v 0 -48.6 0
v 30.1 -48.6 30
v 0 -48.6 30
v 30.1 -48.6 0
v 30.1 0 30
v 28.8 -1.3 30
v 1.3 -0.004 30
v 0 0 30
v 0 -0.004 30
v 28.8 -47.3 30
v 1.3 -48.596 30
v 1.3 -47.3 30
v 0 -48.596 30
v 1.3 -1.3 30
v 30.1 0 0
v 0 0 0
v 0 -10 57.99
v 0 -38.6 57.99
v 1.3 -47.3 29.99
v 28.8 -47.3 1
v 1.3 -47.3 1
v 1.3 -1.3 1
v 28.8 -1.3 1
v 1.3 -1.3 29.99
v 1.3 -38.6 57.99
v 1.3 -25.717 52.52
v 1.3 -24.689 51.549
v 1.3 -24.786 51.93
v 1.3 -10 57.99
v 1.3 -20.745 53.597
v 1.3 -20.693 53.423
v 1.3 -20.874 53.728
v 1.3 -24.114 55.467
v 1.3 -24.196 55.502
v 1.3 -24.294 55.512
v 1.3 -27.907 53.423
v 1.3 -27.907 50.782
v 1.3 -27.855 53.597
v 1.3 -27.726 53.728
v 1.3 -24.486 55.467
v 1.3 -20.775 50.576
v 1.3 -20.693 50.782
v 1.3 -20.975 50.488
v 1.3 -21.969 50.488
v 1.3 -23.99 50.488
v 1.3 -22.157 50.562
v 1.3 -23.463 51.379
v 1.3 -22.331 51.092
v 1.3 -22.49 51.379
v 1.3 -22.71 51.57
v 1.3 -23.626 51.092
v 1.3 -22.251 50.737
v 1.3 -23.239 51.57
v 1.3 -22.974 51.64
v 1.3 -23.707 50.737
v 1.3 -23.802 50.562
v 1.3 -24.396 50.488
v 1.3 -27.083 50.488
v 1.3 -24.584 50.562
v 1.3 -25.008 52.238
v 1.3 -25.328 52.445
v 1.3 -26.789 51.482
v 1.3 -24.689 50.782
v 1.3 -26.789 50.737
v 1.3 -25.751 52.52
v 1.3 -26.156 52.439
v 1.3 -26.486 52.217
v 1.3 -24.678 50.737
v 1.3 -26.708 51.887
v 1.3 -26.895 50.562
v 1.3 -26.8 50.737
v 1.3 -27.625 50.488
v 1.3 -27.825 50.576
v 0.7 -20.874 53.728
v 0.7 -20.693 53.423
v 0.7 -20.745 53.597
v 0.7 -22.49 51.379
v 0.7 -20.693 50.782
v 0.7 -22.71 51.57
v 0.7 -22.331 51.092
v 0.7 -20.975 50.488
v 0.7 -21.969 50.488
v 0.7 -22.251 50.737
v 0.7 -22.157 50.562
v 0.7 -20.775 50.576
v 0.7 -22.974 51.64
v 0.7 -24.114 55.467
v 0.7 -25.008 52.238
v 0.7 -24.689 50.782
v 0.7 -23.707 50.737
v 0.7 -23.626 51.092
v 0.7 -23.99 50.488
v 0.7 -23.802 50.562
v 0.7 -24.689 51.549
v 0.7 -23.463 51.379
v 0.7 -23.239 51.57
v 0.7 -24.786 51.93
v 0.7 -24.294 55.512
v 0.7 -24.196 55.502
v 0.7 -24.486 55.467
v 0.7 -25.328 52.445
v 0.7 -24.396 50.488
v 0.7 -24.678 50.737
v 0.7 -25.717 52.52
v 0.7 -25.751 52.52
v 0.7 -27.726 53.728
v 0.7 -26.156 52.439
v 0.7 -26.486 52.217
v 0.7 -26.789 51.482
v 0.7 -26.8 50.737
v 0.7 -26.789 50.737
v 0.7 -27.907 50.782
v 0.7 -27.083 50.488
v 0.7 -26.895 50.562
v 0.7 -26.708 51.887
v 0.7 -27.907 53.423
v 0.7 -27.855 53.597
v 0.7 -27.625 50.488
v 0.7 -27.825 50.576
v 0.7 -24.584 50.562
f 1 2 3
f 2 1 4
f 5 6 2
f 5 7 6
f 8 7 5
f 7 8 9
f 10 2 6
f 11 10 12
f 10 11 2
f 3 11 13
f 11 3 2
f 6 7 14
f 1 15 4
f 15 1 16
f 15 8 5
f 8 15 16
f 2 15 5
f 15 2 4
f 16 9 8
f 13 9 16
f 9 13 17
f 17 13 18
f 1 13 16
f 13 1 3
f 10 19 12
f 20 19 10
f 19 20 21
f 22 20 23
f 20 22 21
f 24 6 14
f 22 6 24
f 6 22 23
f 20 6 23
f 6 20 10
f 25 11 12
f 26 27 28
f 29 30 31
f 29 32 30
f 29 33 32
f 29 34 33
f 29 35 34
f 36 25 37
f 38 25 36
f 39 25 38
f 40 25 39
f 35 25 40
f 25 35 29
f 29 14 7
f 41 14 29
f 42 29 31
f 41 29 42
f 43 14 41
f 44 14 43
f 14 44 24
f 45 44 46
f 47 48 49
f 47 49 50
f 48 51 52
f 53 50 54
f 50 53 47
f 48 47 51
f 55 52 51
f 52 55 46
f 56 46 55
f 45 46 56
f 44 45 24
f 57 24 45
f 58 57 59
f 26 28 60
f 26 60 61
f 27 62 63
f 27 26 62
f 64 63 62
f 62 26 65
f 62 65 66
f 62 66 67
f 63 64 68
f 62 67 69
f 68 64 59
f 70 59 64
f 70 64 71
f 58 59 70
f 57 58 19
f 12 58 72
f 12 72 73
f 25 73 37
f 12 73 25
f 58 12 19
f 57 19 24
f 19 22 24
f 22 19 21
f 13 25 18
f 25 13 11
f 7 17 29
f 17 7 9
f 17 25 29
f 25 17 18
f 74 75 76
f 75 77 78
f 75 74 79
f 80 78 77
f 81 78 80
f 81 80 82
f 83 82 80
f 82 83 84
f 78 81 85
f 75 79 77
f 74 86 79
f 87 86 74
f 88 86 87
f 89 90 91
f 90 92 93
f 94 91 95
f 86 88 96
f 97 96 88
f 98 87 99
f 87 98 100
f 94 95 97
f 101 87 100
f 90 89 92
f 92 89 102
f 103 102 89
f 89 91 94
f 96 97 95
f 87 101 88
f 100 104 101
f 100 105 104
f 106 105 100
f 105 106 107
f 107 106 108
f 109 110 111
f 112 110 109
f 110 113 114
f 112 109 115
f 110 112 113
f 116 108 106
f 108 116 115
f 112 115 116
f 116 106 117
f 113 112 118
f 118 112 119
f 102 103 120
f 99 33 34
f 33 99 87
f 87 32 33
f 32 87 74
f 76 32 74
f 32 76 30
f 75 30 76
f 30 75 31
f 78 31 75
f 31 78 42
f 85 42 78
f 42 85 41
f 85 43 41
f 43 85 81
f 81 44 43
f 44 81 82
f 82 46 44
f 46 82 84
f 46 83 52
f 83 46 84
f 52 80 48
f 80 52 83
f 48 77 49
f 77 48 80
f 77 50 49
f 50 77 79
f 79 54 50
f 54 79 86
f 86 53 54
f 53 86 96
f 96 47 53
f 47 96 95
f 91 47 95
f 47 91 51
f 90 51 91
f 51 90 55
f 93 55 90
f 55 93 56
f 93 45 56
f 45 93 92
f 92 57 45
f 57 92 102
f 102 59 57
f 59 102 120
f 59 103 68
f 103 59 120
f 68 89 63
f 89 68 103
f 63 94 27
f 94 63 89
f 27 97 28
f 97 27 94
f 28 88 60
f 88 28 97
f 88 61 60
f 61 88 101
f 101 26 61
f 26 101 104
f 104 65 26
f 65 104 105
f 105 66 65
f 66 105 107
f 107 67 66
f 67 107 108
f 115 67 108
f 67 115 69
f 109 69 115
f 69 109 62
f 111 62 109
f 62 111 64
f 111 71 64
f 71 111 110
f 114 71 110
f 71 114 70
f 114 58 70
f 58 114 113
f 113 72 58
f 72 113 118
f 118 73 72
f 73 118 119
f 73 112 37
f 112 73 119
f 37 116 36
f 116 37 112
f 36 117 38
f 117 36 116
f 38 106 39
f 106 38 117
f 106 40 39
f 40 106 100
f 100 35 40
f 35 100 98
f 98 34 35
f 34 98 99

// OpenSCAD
floor_thickness = 1;
wall_thickness = 1.3;
wall_height = 30; // [25:40]
tab_height = 28;
icon = "abbey"; // [none:None,abbey:Abbey and Mayor,bridges:Bridges Castles and Bazaar,catapult:Catapult,count:Count,crop:Crop Circles,ferry:Ferries,flyer:Flyers,gold:Gold Mines,inns:Inns and Cathedrals,king:King,mage:Mage and Witch,messages:Messages,plague:Plague,princess:Princess and Dragon,robbers:Robbers,spielbox:Spielbox,tower:Tower,traders:Traders and Builders,wheel:Wheel of Fortune]

inset = 0.9;

inside_length = 27.5;

/* [Hidden] */
length = inside_length + wall_thickness * 2;
width = 46 + wall_thickness * 2;
fudge = 0.1;

rotate(a=[0,0,-90]) {
difference () {
union () {
difference () {
	cube([width,length,wall_height]);
	translate ([wall_thickness,wall_thickness,floor_thickness]) {
		cube([46,inside_length,wall_height]);
	}
};
translate([0,wall_thickness,wall_height-.01])
rotate(a=[90,0,0])
linear_extrude(height = wall_thickness)
	polygon(points=[[0,0],[10,tab_height],[width - 10,tab_height],[width,0]]);
};

translate([width/2,1.5 - inset + fudge,wall_height + tab_height - 5])
rotate(a=[90,0,180])
	if (icon == "abbey")
		abbey(inset + fudge);
	else if (icon == "bridges")
		bridges(inset + fudge);
	else if (icon == "catapult")
		catapult(inset + fudge);
	else if (icon == "count")
		count(inset + fudge);
	else if (icon == "crop")
		crop(inset + fudge);
	else if (icon == "ferry")
		ferry(inset + fudge);
	else if (icon == "flyer")
		flyer(inset + fudge);
	else if (icon == "gold")
		gold(inset + fudge);
	else if (icon == "inns")
		inns(inset + fudge);
	else if (icon == "king")
		king(inset + fudge);
	else if (icon == "mage")
		mage(inset + fudge);
	else if (icon == "messages")
		messages(inset + fudge);
	else if (icon == "plague")
		plague(inset + fudge);
	else if (icon == "princess")
		princess(inset + fudge);
	else if (icon == "robbers")
		robbers(inset + fudge);
	else if (icon == "spielbox")
		spielbox(inset + fudge);
	else if (icon == "tower")
		tower(inset + fudge);
	else if (icon == "traders")
		traders(inset + fudge);
	else if (icon == "wheel")
		wheel(inset + fudge);
	else if (icon == "m")
		m(inset + fudge);
};
};

module abbey(h) {
  scale([25.4/90, -25.4/90, 1])
  {
    linear_extrude(height=h)
      polygon([[4.699935,4.819935],[5.634285,5.066798],[6.414915,5.744925],[6.978016,6.760539],[7.259905,8.019895],[7.594905,8.639885],[8.259895,8.899885],[11.779845,8.899885],[12.489835,8.589885],[12.779835,7.859895],[12.779835,-1.499985],[12.594835,-2.114975],[12.139845,-2.579965],[0.659995,-8.739885],[0.369995,-8.864885],[0.019995,-8.899885],[-0.659995,-8.739885],[-12.139845,-2.579965],[-12.594835,-2.114975],[-12.779835,-1.499985],[-12.779835,7.859895],[-12.489845,8.589885],[-11.779845,8.899885],[-9.859875,8.899885],[-9.194885,8.639885],[-8.859885,8.019895],[-8.819885,8.019895],[-8.819885,5.379925],[-8.531781,3.944327],[-7.744905,2.774965],[-6.575549,1.988103],[-5.139935,1.699975],[-5.019935,1.699975],[-3.641211,1.967463],[-2.509965,2.699965],[-1.723740,3.792454],[-1.379985,5.139935],[-1.379985,7.859895],[-1.359985,7.939895],[-1.339985,8.019895],[-1.004985,8.639885],[-0.339995,8.899885],[1.099985,8.899885],[1.764975,8.639885],[2.099975,8.019895],[2.388076,6.760539],[2.964965,5.744925],[3.759314,5.066813],[4.699935,4.819935]]);
};
};
module bridges(h) {
  scale([25.4/90, -25.4/90, 1])
  {
    linear_extrude(height=h)
      polygon([[-13.159830,7.079910],[-9.959870,7.079910],[-9.959870,5.199930],[-9.738297,3.193399],[-9.181121,1.361236],[-8.288330,-0.296557],[-7.059910,-1.779980],[-5.576498,-3.008394],[-3.918709,-3.901191],[-2.086542,-4.458373],[-0.080000,-4.679940],[0.120000,-4.679940],[2.128714,-4.458365],[3.964936,-3.901184],[5.628668,-3.008391],[7.119910,-1.779980],[8.356128,-0.296557],[9.254860,1.361236],[9.816107,3.193399],[10.039870,5.199930],[10.039870,7.079910],[13.159830,7.079910],[13.159830,-7.079910],[-13.159830,-7.079910]]);
};
};
module catapult(h) {
difference()
{
  scale([25.4/90, -25.4/90, 1])
  {
    linear_extrude(height=h)
         polygon([[-9.779880,8.079900],[-8.689890,9.349880],[-7.059910,9.839870],[-5.429930,9.349880],[-4.339950,8.079900],[4.699940,8.079900],[5.789920,9.349880],[7.419900,9.839870],[9.049880,9.349880],[10.139870,8.079900],[10.939860,8.079900],[10.939860,5.399930],[10.059870,5.399930],[9.289880,4.484940],[8.219890,3.959950],[2.059970,-5.119930],[1.939970,-5.119930],[1.939970,-5.159930],[0.060000,-5.159930],[0.060000,-9.799870],[-0.020000,-9.819870],[-0.100000,-9.839870],[-1.266868,-9.595477],[-2.234970,-8.934880],[-2.895598,-7.966755],[-3.139960,-6.799910],[-2.956215,-5.775535],[-2.449970,-4.904940],[-1.688738,-4.251809],[-0.739990,-3.879950],[-0.739990,5.399930],[-4.419950,5.399930],[-5.514930,4.274940],[-7.059910,3.839950],[-8.604890,4.274950],[-9.699880,5.399930],[-10.939860,5.399930],[-10.939860,8.079900]]);
	};
  scale([25.4/90, -25.4/90, 1])
  {
    linear_extrude(height=h)
           polygon([[5.419930,4.639940],[5.069930,5.004940],[4.779940,5.399930],[1.939970,5.399930],[1.939970,-0.439990]]);
	};
};
};
module count(h) {
  scale([25.4/90, -25.4/90, 1])
  {
    linear_extrude(height=h)
      polygon([[-11.179855,-2.259990],[-11.259855,9.579860],[11.259855,9.539860],[11.179855,-3.899970],[10.659865,-3.899970],[9.459875,-1.779990],[9.499875,-1.659990],[9.939875,-1.340000],[9.979875,-0.220010],[9.739885,0.099980],[9.739885,0.979970],[9.379885,1.499970],[9.379885,1.579970],[9.459885,1.579970],[9.459885,1.699970],[9.499885,1.699970],[9.539885,2.059970],[9.499885,2.059970],[9.499885,2.139970],[9.539885,2.139970],[9.539885,2.659960],[8.459895,2.659960],[7.859905,2.739960],[7.859905,1.859970],[7.899905,1.859970],[7.899905,1.779970],[7.859905,1.739970],[7.819905,1.659970],[7.819905,1.579970],[6.739925,-0.500000],[6.699925,-1.059990],[6.619925,-0.460000],[5.779935,1.539970],[5.779935,1.619970],[5.739935,1.619970],[5.819935,1.739970],[5.939935,1.739970],[5.979935,2.939960],[5.859935,3.019960],[5.859935,3.099960],[5.899935,3.099960],[5.899935,3.139960],[5.699935,3.179960],[5.459935,3.219960],[5.459935,3.419960],[5.659935,3.419960],[5.619935,3.619960],[5.499935,3.619960],[5.459935,3.539960],[5.339935,3.619960],[5.339935,4.139950],[5.219945,4.139950],[5.259945,4.259950],[5.339945,4.299950],[5.339945,4.819940],[2.979985,4.899940],[2.979985,4.859940],[3.059985,4.819940],[3.059985,4.699940],[2.979985,4.699940],[2.979985,2.619970],[3.174975,2.169980],[2.619985,1.779980],[1.140005,1.384990],[-0.339975,0.899990],[-0.379975,0.740000],[-0.379975,-1.939970],[-0.299975,-1.979970],[-0.219975,-2.259970],[-0.379975,-2.419960],[-0.379975,-3.099960],[-0.339975,-3.099960],[-0.339975,-3.259950],[-0.419975,-3.379950],[-0.459975,-5.979920],[-0.259975,-6.139920],[-0.699975,-7.579900],[-0.899965,-7.739900],[-2.059955,-7.939890],[-2.339955,-7.979890],[-2.419955,-8.259890],[-2.374955,-8.359890],[-2.419955,-8.459890],[-2.419955,-8.659880],[-2.269955,-8.559880],[-2.179955,-8.459880],[-2.084955,-8.269880],[-1.779955,-8.019880],[-1.699955,-8.019880],[-1.714955,-8.199880],[-1.699955,-8.379880],[-1.539965,-8.209880],[-1.379965,-8.099880],[-1.299965,-8.179880],[-1.579965,-8.584880],[-1.859955,-8.899870],[-2.104955,-9.284870],[-2.379955,-9.579860],[-2.539945,-9.579860],[-2.539945,-8.459880],[-2.619945,-8.389880],[-2.579945,-8.259880],[-2.619945,-7.939880],[-2.979945,-7.939880],[-4.939915,-7.499890],[-4.939915,-7.219890],[-4.859915,-7.179890],[-4.859915,-7.019890],[-4.739925,-6.939890],[-4.699925,-4.099920],[-4.819915,-4.099920],[-4.819915,-3.899930],[-4.779915,-3.899930],[-4.739915,-2.979940],[-4.859905,-2.939940],[-4.859905,-2.779940],[-4.779905,-2.739940],[-4.779905,-1.419960],[-4.859905,1.620000],[-6.179895,1.620000],[-6.219895,-1.739950],[-7.499875,-2.539940],[-7.979865,-2.499940],[-7.979865,-2.059950],[-7.939865,-2.059950],[-7.939865,-1.859950],[-8.699855,-2.379940]]);
	};
};

module crop(h) {
  scale([25.4/90, -25.4/90, 1])
	union() {
    linear_extrude(height=h)
      polygon([[-0.719995,6.579910],[-0.879995,8.099890],[-0.550625,9.979249],[0.434995,11.524850],[2.073091,12.627965],[4.359945,13.179830],[4.399945,12.139840],[2.678081,11.689225],[1.424975,10.814860],[0.659360,9.513005],[0.399995,7.779900],[0.439995,6.819910],[-0.020005,5.874920],[-0.719995,6.579910]]);
    linear_extrude(height=h)
      polygon([[0.159995,4.779940],[0.039995,5.339930],[0.259995,5.844920],[0.839985,6.019920],[1.619975,5.829920],[2.519965,5.219930],[3.464955,3.674950],[4.199945,1.739980],[1.909975,2.884960],[0.903731,3.579336],[0.159995,4.779940]]);
    linear_extrude(height=h)
      polygon([[-2.719965,5.179930],[-1.834975,5.789920],[-1.039985,5.979920],[-0.479995,5.804920],[-0.279995,5.299930],[-0.399995,4.739940],[-1.137493,3.539961],[-2.129975,2.849960],[-4.399945,1.739980],[-3.664955,3.639950],[-2.719965,5.179930]]);
    linear_extrude(height=h)
      polygon([[-2.679965,2.259970],[-1.799985,2.869960],[-1.039985,3.059960],[-0.459995,2.864960],[-0.240005,2.339970],[-0.359995,1.819970],[-1.079993,0.637500],[-2.069975,-0.050000],[-4.319945,-1.139990],[-3.604955,0.754990],[-2.679965,2.259970]]);
    linear_extrude(height=h)
      polygon([[0.199995,1.739980],[0.079995,2.299970],[0.299995,2.804960],[0.879985,2.979960],[1.659975,2.789960],[2.559965,2.179970],[3.504955,0.639990],[4.239945,-1.259990],[1.919975,-0.090000],[0.921231,0.585001],[0.199995,1.739980]]);
    linear_extrude(height=h)
      polygon([[0.199995,-1.179990],[0.079995,-0.619990],[0.299995,-0.095000],[0.879985,0.100000],[1.674975,-0.090000],[2.559965,-0.699990],[3.504955,-2.259970],[4.239945,-4.179950],[1.949975,-3.069960],[0.943731,-2.379960],[0.199995,-1.179990]]);
    linear_extrude(height=h)
      polygon([[-2.679965,-0.739990],[-1.794985,-0.130000],[-0.999995,0.060000],[-0.439995,-0.115000],[-0.240005,-0.619990],[-0.359995,-1.179990],[-1.091242,-2.362460],[-2.069975,-3.049960],[-4.319945,-4.139950],[-3.604955,-2.244970],[-2.679965,-0.739990]]);
    linear_extrude(height=h)
      polygon([[-2.679965,-3.659950],[-1.794985,-3.049960],[-0.999995,-2.859960],[-0.439995,-3.034960],[-0.240005,-3.539960],[-0.359995,-4.099950],[-1.097492,-5.306166],[-2.089975,-6.009920],[-4.359945,-7.139910],[-3.624955,-5.219930],[-2.679965,-3.659950]]);
    linear_extrude(height=h)
      polygon([[0.199995,-4.139950],[0.079995,-3.579960],[0.279995,-3.074960],[0.839985,-2.899960],[1.634975,-3.089960],[2.519965,-3.699950],[3.464955,-5.239930],[4.199945,-7.139910],[1.929975,-6.029920],[0.937481,-5.339920],[0.199995,-4.139950]]);
    linear_extrude(height=h)
      polygon([[0.319995,-6.939910],[0.199995,-6.459920],[0.394995,-5.989920],[0.919985,-5.819930],[2.439965,-6.539920],[3.269955,-7.934900],[3.919945,-9.659880],[1.879975,-8.644890],[0.983731,-8.011756],[0.319995,-6.939910]]);
    linear_extrude(height=h)
      polygon([[-2.479975,-6.539920],[-1.679985,-5.999920],[-0.999995,-5.819930],[-0.474995,-5.989930],[-0.279995,-6.459920],[-0.399995,-6.939910],[-1.063743,-8.011756],[-1.959975,-8.644890],[-3.999955,-9.659880],[-3.329955,-7.934900],[-2.479975,-6.539920]]);
    linear_extrude(height=h)
      polygon([[0.199995,-9.259880],[0.079995,-8.859890],[0.244995,-8.499890],[0.679985,-8.379890],[1.254985,-8.509890],[1.919975,-8.939890],[2.614965,-10.064870],[3.159955,-11.459850],[1.484975,-10.644860],[0.746856,-10.137972],[0.199995,-9.259880]]);
    linear_extrude(height=h)
      polygon([[-1.999975,-9.019890],[-1.349985,-8.534890],[-0.759995,-8.379890],[-0.359995,-8.504890],[-0.200005,-8.899890],[-0.280005,-9.259880],[-0.756882,-10.174226],[-1.454995,-10.724860],[-3.079975,-11.619850],[-2.629975,-10.184870],[-1.999985,-9.019890]]);
    linear_extrude(height=h)
      polygon([[-1.399985,-11.139860],[-0.939995,-10.619860],[-0.479995,-10.459870],[-0.225005,-10.559870],[-0.120005,-10.899860],[-0.120005,-11.019860],[-0.724995,-12.249840],[-1.719985,-13.179830],[-1.634985,-12.069850],[-1.399985,-11.139860]]);
    linear_extrude(height=h)
      polygon([[-0.000005,-11.019860],[-0.000005,-10.899860],[0.104995,-10.559870],[0.359995,-10.459870],[0.819985,-10.619860],[1.279985,-11.139860],[1.534975,-12.069850],[1.639975,-13.179830],[0.624985,-12.249840],[-0.000005,-11.019860]]);
};
};

module ferry(h)
{
  scale([25.4/90, -25.4/90, 1]) union()
  {
    linear_extrude(height=h)
      polygon([[-8.499890,3.339955],[8.499890,3.339955],[12.339840,-1.099985],[12.339840,-3.339955],[0.300000,-2.979965],[-12.339840,-3.339955],[-12.339840,-1.099985]]);
  }
}

module flyer(h)
{
  scale([25.4/90, -25.4/90, 1]) union()
  {
    linear_extrude(height=h)
      polygon([[-12.739835,4.059950],[-11.049855,3.934950],[-9.419875,3.899950],[-4.969316,4.251811],[-0.904985,5.274930],[2.791826,6.920541],[6.139925,9.139880],[6.539915,8.579890],[5.219935,7.699900],[5.981155,5.658682],[7.109905,3.849950],[8.583620,2.266228],[10.379865,0.899990],[12.699835,1.019990],[12.739835,0.500000],[10.619865,0.380000],[8.859885,-2.234970],[8.299895,-4.819940],[8.559885,-6.619910],[9.299875,-8.419890],[11.139855,-8.579890],[11.099855,-9.139880],[7.626766,-8.602691],[4.247433,-7.673638],[0.961853,-6.352721],[-2.229975,-4.639940],[-8.002401,-0.556234],[-12.739835,4.059950]]);
  }
}

module gold(h)
{
  scale([25.4/90, -25.4/90, 1]) union()
  {
    linear_extrude(height=h)
      polygon([[-8.759885,3.519950],[8.759885,3.519950],[5.959925,-3.519950],[-5.959925,-3.519950]]);
  }
}

module inns(h)
{
  scale([25.4/90, -25.4/90, 1]) union()
  {
    linear_extrude(height=h)
      polygon([[-10.639865,9.759870],[-10.874865,10.429870],[-10.959865,11.039860],[-10.514865,12.104840],[-9.319885,12.479840],[-9.239885,12.479840],[-3.599955,12.479840],[-2.864965,12.114840],[-2.279975,11.239850],[-0.000005,6.599910],[0.039995,6.599910],[2.279965,11.239850],[2.864955,12.114840],[3.599955,12.479840],[9.279875,12.479840],[9.359875,12.479840],[10.534865,12.104840],[10.959855,11.039860],[10.639865,9.759870],[6.519915,1.039990],[8.989885,0.624990],[11.039855,-0.000000],[11.834845,-0.539990],[12.119845,-1.319980],[11.899845,-2.119970],[11.199855,-3.039960],[7.959895,-5.389930],[3.639955,-7.079910],[3.386824,-9.374862],[2.724965,-11.069860],[1.620590,-12.119824],[0.039995,-12.479840],[-0.000005,-12.479840],[-1.586864,-12.119835],[-2.704965,-11.069860],[-3.380589,-9.374863],[-3.639955,-7.079910],[-7.959905,-5.389930],[-11.199855,-3.039960],[-11.899855,-2.119970],[-12.119845,-1.319980],[-11.834845,-0.539990],[-11.039865,-0.000000],[-8.969885,0.624990],[-6.479915,1.039990]]);
  }
}

module king(h)
{
  scale([25.4/90, -25.4/90, 1]) union()
  {
    linear_extrude(height=h)
      polygon([[-10.619865,7.699900],[10.619865,7.699900],[10.579865,-0.499990],[11.259855,-7.579900],[7.859895,-0.739990],[5.619925,-7.619900],[2.859965,-0.739990],[0.019995,-7.699900],[-2.819965,-0.739990],[-5.619925,-7.619900],[-7.859905,-0.739990],[-11.259855,-7.579900],[-10.579865,-0.499990]]);
  }
}

module mage(h)
{
  scale([25.4/90, -25.4/90, 1]) union()
  {
    linear_extrude(height=h)
      polygon([[-10.799860,8.439890],[-10.558457,8.972388],[-9.950498,9.459884],[-7.634900,10.299870],[-4.201825,10.869861],[0.000000,11.079860],[4.201810,10.869861],[7.634900,10.299870],[9.950479,9.459884],[10.558445,8.972388],[10.799860,8.439890],[10.503604,7.828029],[9.659870,7.264910],[6.599910,6.359920],[0.000000,-11.079860],[-6.639920,6.359920],[-9.679880,7.264910],[-10.509866,7.828033],[-10.799860,8.439890]]);
  }
}

module messages(h)
{
  scale([25.4/90, -25.4/90, 1]) union()
  {
    linear_extrude(height=h)
      polygon([[-11.839845,6.379920],[-11.839845,6.739920],[-11.384855,8.229900],[-9.759875,9.179880],[7.839905,9.179880],[6.804275,8.936135],[6.124925,8.489890],[5.639925,7.259910],[5.694925,6.819920],[5.839925,6.379920]]);
    linear_extrude(height=h)
      polygon([[10.719865,-9.179880],[7.479905,-9.179880],[-6.199915,-9.099880],[-7.021164,-8.839249],[-7.579905,-8.094890],[-7.999895,-5.379930],[-7.964895,-4.159940],[-7.839895,-2.819960],[-7.434905,1.009990],[-7.239905,4.419950],[-7.279905,5.579930],[6.919915,5.539930],[6.959915,5.579930],[6.454915,6.389920],[6.279925,7.379910],[6.289925,7.699900],[6.359925,8.019900],[7.019925,8.689890],[8.039905,8.939890],[8.384905,8.889890],[8.639895,8.779890],[9.198625,8.149900],[9.569885,7.189910],[9.839885,4.459950],[9.659885,1.059990],[9.239895,-2.819960],[9.039895,-5.819920],[9.429895,-8.204890],[9.951116,-8.874241],[10.719875,-9.179880]]);
    linear_extrude(height=h)
      polygon([[10.959855,-9.179880],[10.432975,-8.910472],[10.014875,-8.224890],[9.639875,-6.339920],[9.639875,-6.099920],[11.079855,-6.099920],[11.639855,-6.929910],[11.839845,-7.819900],[11.624855,-8.634890],[10.959855,-9.179880]]);
  }
}

module plague(h)
{
  scale([25.4/90, -25.4/90, 1]) union()
  {
    linear_extrude(height=h)
      polygon([[-2.399970,-9.279885],[-1.919970,-8.879885],[-1.999970,-7.799905],[-5.389930,-7.099915],[-8.599890,-6.039925],[-9.359880,-5.359935],[-9.229880,-5.079935],[-8.799890,-4.799935],[-5.854920,-4.359945],[-2.159970,-4.159945],[-2.199970,-3.319955],[-6.233050,-2.088710],[-9.384880,-0.369995],[-11.644226,1.843736],[-12.999830,4.559945],[-11.739850,3.414963],[-10.239870,2.719965],[-8.984880,2.604965],[-7.639900,2.159975],[-7.439900,2.159975],[-5.709930,2.059975],[-3.559950,1.959975],[-2.624970,1.999975],[-1.959970,2.159975],[-1.784980,2.564965],[-1.279980,2.879965],[-1.054980,3.414955],[-0.439990,3.919945],[-0.399990,4.279945],[-0.684990,5.244935],[-1.479980,6.119925],[-2.559972,6.834914],[-3.519950,7.879895],[-3.759950,8.479885],[-3.149960,9.209875],[-1.039990,9.759875],[0.574990,10.104865],[2.279970,10.239865],[4.189305,10.068605],[6.274920,9.499875],[8.563000,8.451145],[11.079860,6.839915],[9.574880,5.869925],[8.159900,4.719935],[6.999910,2.639965],[6.559920,-0.279995],[6.569920,-1.029985],[6.639920,-1.839975],[6.994910,-2.639965],[7.199910,-3.559955],[8.379890,-3.539955],[9.559880,-3.519955],[10.939860,-3.559955],[12.319840,-3.719955],[12.839840,-3.989945],[12.999830,-4.319945],[12.399840,-5.119935],[8.079900,-7.079905],[8.514890,-7.999895],[9.399880,-8.559895],[9.814870,-8.859885],[9.479880,-9.159885],[9.019880,-9.304885],[8.559890,-9.359885],[8.279890,-9.334885],[7.999900,-9.279885],[6.584920,-10.029875],[4.479940,-10.239865],[-1.999970,-10.239865],[-2.799960,-9.894875],[-2.399970,-9.279885]]);
  }
}

module princess(h)
{
  scale([25.4/90, -25.4/90, 1]) union()
  {
    linear_extrude(height=h)
      polygon([[-6.399915,10.639865],[-6.519915,11.359855],[-5.994925,12.594835],[-4.599935,13.079835],[-1.879975,13.039835],[0.020005,13.019835],[1.919975,12.999835],[4.639945,12.999835],[6.014925,12.494835],[6.519915,11.239855],[6.399915,10.479865],[4.279945,4.439945],[3.909955,3.359955],[3.479955,2.159975],[3.319955,1.679975],[6.159925,1.679975],[7.399905,1.159985],[7.919895,-0.079995],[7.919895,-0.119995],[7.399905,-1.359985],[6.159925,-1.879975],[2.239975,-1.879975],[2.319975,-2.079975],[2.844965,-4.059945],[3.039965,-6.399915],[2.812451,-8.945491],[2.179975,-11.074855],[1.217479,-12.536694],[0.000005,-13.079835],[-1.211239,-12.531054],[-2.159975,-11.059855],[-2.778715,-8.928616],[-2.999955,-6.399915],[-2.824965,-4.094945],[-2.319965,-2.119975],[-2.199975,-1.879975],[-6.119915,-1.879975],[-7.379905,-1.359985],[-7.919895,-0.119995],[-7.919895,-0.079995],[-7.379905,1.159985],[-6.119915,1.679975],[-3.319955,1.679975],[-3.479955,2.159975],[-3.929945,3.414955],[-4.319945,4.519945]]);
  }
}

module robbers(h)
{
  scale([25.4/90, -25.4/90, 1]) union()
  {
    linear_extrude(height=h)
      polygon([[-5.559925,-11.539845],[-5.649925,-11.369855],[-5.679925,-11.139855],[-4.699945,-8.854885],[-2.999965,-6.899905],[-3.539955,-6.454915],[-3.719955,-5.739925],[-3.554955,-5.034935],[-3.119965,-4.539935],[-6.221802,-2.188080],[-7.281945,-0.850444],[-8.014905,0.594995],[-8.840516,3.700587],[-9.039885,7.019915],[-8.994885,9.259885],[-8.919885,11.499855],[-8.093650,12.104850],[-6.509915,12.499845],[-2.839965,12.779835],[2.859955,12.739835],[7.359905,12.579845],[8.504885,11.934845],[8.959885,10.539865],[9.014885,9.444885],[9.039885,8.379895],[8.723004,4.544326],[7.734895,1.094985],[6.019285,-1.941831],[3.519955,-4.539935],[4.079945,-4.969935],[4.279945,-5.699925],[4.099945,-6.364915],[3.559955,-6.819905],[6.009915,-9.264875],[6.552400,-10.267971],[6.719915,-11.139855],[6.499915,-12.009845],[5.919925,-12.699835],[5.879925,-12.699835],[5.184925,-11.934845],[4.159945,-11.139855],[4.119945,-11.139855],[3.509955,-11.414845],[2.959955,-12.019845],[2.264957,-12.594818],[1.599975,-12.779835],[1.199985,-12.724835],[0.799985,-12.579835],[-0.090005,-12.004845],[-0.919995,-11.219855],[-1.379985,-10.894855],[-1.839975,-10.779855],[-2.679965,-11.099855],[-3.539955,-11.549845],[-4.519945,-11.699845],[-5.559935,-11.539845]]);
  }
}

module spielbox(h)
{
  scale([25.4/90, -25.4/90, 1]) union()
  {
    linear_extrude(height=h)
      polygon([[10.599865,-2.359970],[-0.000005,-10.079870],[-10.599865,-2.359970],[-6.559915,10.079870],[6.559915,10.079870]]);
  }
}

module tower(h)
{
  scale([25.4/90, -25.4/90, 1]) union()
  {
    linear_extrude(height=h)
      polygon([[-4.799935,11.259855],[4.799935,11.259855],[4.119945,-6.379915],[5.599925,-6.379915],[5.839925,-11.259855],[4.039945,-11.259855],[4.039945,-9.979875],[2.319965,-9.979875],[2.319965,-11.259855],[0.799985,-11.259855],[0.799985,-9.979875],[-0.799995,-9.979875],[-0.799995,-11.259855],[-2.319975,-11.259855],[-2.319975,-9.979875],[-4.039945,-9.979875],[-4.039945,-11.259855],[-5.839925,-11.259855],[-5.599925,-6.379915],[-4.119945,-6.379915]]);
  }
}

module traders(h)
{
  scale([25.4/90, -25.4/90, 1]) union()
  {
    linear_extrude(height=h)
      polygon([[-3.919950,6.399920],[-3.559950,6.849910],[-2.959960,6.999910],[-2.294970,6.794910],[-1.959970,6.199920],[-1.999970,4.599940],[0.854990,4.849940],[3.679950,4.919940],[4.999940,4.899940],[6.319920,4.879940],[6.399920,6.319920],[6.739910,6.824910],[7.439900,6.999910],[8.099900,6.824910],[8.399890,6.319920],[8.399890,6.279920],[8.439890,5.519930],[8.973619,4.603694],[9.769870,3.859950],[10.521096,2.876219],[10.919860,1.239980],[10.959860,0.559990],[10.804977,-1.239979],[10.319870,-2.679970],[10.359870,-2.679970],[11.250462,-2.983704],[11.844850,-3.489960],[12.279840,-4.839940],[12.199840,-5.319930],[11.664850,-6.274920],[10.559860,-6.719910],[9.879870,-6.599920],[9.249880,-6.039920],[9.039880,-5.239930],[9.279880,-4.439940],[9.999870,-4.119950],[10.569860,-4.274950],[10.959860,-4.639940],[10.799860,-5.239930],[10.174870,-4.924940],[9.879870,-5.119940],[9.879870,-5.239930],[10.124870,-5.689930],[10.639860,-5.839930],[11.079860,-5.679930],[11.349850,-5.304930],[11.439850,-4.839940],[11.084860,-3.944950],[9.919870,-3.439960],[9.879870,-3.399960],[8.814870,-4.435560],[7.449900,-5.114940],[3.999950,-5.599930],[0.245000,-5.294930],[-3.719950,-4.599940],[-3.679950,-4.879940],[-3.888714,-5.801790],[-4.419940,-6.344920],[-5.879920,-6.999910],[-6.384920,-5.759930],[-6.559920,-4.399940],[-11.679850,-3.079960],[-12.159840,-2.884960],[-12.279840,-2.479970],[-12.259840,-2.199970],[-12.239840,-1.919980],[-12.149840,-1.604980],[-12.119840,-1.319980],[-12.139840,-1.019990],[-12.159840,-0.719990],[-12.029840,-0.245000],[-11.479850,0.319990],[-10.534860,1.044990],[-7.639900,1.559980],[-7.177414,2.401224],[-6.279920,3.189960],[-3.959950,4.999930]]);
  }
}

module m(h)
{
  scale([25.4/90, -25.4/90, 1]) union()
  {
    linear_extrude(height=h)
      polygon([[14.228490,14.003905],[8.564430,14.003905],[8.564430,-2.753905],[8.798810,-8.750005],[8.642560,-8.750005],[8.330060,-7.500005],[7.978490,-6.318365],[7.636700,-5.322265],[7.353490,-4.609375],[2.040990,5.605465],[-2.373070,5.605465],[-7.509790,-4.648445],[-7.724630,-5.205085],[-8.017600,-6.123055],[-8.339860,-7.324225],[-8.623070,-8.750005],[-8.798850,-8.750005],[-8.603540,-5.371095],[-8.544940,-2.773445],[-8.544940,14.003905],[-14.228540,14.003905],[-14.228540,-14.003905],[-6.494160,-14.003905],[-1.552760,-4.277345],[-1.123070,-3.281255],[-0.703150,-2.226565],[-0.332050,-1.201175],[-0.087910,-0.273445],[0.009790,-0.273445],[0.263700,-1.240235],[0.556670,-2.324225],[0.888700,-3.388675],[1.259790,-4.316405],[6.337920,-14.003905],[14.228540,-14.003905]]);
  }
}
